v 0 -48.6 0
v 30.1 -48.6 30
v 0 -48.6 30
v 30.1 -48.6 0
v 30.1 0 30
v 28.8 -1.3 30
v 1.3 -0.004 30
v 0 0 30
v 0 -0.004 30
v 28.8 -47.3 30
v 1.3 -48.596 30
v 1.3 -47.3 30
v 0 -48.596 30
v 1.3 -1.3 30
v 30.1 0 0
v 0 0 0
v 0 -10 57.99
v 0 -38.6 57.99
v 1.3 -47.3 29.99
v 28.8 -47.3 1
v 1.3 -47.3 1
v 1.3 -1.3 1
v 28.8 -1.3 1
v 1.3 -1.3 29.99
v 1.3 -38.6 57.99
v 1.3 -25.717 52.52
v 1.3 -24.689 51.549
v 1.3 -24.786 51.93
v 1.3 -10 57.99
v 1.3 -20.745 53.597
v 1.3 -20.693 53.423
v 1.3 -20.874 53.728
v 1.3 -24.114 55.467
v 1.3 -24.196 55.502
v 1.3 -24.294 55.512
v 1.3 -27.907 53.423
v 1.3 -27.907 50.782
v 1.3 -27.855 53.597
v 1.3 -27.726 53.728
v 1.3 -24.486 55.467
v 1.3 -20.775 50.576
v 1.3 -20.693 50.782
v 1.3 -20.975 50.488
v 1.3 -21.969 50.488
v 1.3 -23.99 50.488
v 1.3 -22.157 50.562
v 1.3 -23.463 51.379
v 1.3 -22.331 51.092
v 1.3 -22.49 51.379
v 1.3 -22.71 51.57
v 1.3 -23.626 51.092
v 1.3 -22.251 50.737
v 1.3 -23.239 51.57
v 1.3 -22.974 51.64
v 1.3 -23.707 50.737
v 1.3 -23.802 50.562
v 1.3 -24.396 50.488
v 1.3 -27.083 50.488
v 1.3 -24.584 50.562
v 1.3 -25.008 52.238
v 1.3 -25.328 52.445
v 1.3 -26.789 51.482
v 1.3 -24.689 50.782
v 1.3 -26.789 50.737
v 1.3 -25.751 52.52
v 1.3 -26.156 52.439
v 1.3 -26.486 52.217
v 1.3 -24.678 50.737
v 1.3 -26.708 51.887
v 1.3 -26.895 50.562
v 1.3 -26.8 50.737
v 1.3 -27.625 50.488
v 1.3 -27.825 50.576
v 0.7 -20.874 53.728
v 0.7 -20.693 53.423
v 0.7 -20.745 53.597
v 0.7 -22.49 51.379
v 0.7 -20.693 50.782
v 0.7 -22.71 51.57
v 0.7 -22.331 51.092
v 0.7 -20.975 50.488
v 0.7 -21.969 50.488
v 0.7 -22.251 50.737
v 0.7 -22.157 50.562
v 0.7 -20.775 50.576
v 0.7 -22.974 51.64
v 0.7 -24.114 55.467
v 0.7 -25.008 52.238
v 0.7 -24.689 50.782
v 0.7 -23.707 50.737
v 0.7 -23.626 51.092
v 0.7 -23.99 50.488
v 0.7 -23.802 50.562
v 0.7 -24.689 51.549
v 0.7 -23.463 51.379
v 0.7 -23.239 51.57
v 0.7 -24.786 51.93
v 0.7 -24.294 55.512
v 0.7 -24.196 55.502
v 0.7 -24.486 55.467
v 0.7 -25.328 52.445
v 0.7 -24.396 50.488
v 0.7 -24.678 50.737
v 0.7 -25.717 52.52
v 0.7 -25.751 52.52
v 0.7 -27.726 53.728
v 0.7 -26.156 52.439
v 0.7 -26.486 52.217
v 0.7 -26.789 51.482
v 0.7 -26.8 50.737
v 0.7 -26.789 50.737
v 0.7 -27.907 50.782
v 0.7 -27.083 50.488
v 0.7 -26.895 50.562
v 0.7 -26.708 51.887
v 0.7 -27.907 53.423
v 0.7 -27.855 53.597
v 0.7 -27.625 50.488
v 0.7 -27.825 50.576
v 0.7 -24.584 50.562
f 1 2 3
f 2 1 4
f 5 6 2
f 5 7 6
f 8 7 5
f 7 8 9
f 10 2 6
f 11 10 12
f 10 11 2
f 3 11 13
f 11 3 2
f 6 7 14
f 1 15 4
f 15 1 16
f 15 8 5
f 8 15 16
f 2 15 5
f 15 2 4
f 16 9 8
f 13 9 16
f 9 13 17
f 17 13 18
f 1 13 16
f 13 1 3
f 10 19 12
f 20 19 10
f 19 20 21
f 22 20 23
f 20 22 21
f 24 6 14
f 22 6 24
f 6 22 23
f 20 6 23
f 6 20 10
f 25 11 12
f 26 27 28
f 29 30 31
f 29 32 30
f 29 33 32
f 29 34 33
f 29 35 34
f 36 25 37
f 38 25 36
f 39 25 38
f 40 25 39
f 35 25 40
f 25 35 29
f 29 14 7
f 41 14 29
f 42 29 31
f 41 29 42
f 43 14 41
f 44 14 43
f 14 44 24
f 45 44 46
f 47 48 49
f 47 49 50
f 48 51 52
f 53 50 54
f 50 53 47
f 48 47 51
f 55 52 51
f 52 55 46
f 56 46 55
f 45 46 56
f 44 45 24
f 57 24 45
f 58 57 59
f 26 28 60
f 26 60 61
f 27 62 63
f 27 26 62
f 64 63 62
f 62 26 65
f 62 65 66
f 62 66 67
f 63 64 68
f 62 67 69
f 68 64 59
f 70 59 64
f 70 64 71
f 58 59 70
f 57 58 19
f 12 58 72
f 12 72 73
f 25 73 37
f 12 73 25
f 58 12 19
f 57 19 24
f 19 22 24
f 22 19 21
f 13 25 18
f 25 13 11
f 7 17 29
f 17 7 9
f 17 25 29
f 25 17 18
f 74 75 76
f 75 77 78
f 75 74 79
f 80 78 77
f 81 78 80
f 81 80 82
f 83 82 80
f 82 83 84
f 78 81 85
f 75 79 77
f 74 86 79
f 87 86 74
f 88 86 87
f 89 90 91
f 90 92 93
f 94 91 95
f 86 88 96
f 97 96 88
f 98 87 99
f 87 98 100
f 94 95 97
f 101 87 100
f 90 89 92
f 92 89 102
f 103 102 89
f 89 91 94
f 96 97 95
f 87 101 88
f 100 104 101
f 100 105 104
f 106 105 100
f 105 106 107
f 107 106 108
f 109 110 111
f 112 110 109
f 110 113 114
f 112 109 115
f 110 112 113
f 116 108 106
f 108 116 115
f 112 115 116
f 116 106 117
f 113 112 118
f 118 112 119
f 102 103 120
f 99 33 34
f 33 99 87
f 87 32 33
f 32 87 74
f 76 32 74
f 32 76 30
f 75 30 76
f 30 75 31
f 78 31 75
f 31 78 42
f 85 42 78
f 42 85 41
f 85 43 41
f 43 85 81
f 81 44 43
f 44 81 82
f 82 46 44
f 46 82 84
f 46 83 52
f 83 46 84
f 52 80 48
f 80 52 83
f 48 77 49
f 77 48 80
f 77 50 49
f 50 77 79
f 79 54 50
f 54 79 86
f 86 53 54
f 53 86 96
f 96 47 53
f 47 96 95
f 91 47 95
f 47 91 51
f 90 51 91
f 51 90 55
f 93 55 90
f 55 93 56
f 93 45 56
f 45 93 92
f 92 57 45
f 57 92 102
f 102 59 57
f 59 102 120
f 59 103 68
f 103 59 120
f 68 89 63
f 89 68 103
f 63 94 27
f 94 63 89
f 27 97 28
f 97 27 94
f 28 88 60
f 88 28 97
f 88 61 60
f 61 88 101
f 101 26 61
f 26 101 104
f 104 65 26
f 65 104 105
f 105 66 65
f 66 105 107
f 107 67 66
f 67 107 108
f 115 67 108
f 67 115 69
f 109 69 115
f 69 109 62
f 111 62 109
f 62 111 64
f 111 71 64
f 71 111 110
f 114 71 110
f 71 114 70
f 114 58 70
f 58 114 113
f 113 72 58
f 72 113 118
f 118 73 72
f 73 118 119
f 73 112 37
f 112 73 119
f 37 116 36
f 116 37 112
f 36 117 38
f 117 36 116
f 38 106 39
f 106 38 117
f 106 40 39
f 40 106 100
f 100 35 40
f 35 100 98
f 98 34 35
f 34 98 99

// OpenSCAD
floor_thickness = 1;
wall_thickness = 1.3;
wall_height = 30; // [25:40]
tab_height = 28;
icon = "abbey"; // [none:None,abbey:Abbey and Mayor,bridges:Bridges Castles and Bazaar,catapult:Catapult,count:Count,crop:Crop Circles,ferry:Ferries,flyer:Flyers,gold:Gold Mines,inns:Inns and Cathedrals,king:King,mage:Mage and Witch,messages:Messages,plague:Plague,princess:Princess and Dragon,robbers:Robbers,spielbox:Spielbox,tower:Tower,traders:Traders and Builders,wheel:Wheel of Fortune]

inset = 0.9;

inside_length = 27.5;

/* [Hidden] */
length = inside_length + wall_thickness * 2;
width = 46 + wall_thickness * 2;
fudge = 0.1;

rotate(a=[0,0,-90]) {
difference () {
union () {
difference () {
	cube([width,length,wall_height]);
	translate ([wall_thickness,wall_thickness,floor_thickness]) {
		cube([46,inside_length,wall_height]);
	}
};
translate([0,wall_thickness,wall_height-.01])
rotate(a=[90,0,0])
linear_extrude(height = wall_thickness)
	polygon(points=[[0,0],[10,tab_height],[width - 10,tab_height],[width,0]]);
};

translate([width/2,1.5 - inset + fudge,wall_height + tab_height - 5])
rotate(a=[90,0,180])
	if (icon == "abbey")
		abbey(inset + fudge);
	else if (icon == "bridges")
		bridges(inset + fudge);
	else if (icon == "catapult")
		catapult(inset + fudge);
	else if (icon == "count")
		count(inset + fudge);
	else if (icon == "crop")
		crop(inset + fudge);
	else if (icon == "ferry")
		ferry(inset + fudge);
	else if (icon == "flyer")
		flyer(inset + fudge);
	else if (icon == "gold")
		gold(inset + fudge);
	else if (icon == "inns")
		inns(inset + fudge);
	else if (icon == "king")
		king(inset + fudge);
	else if (icon == "mage")
		mage(inset + fudge);
	else if (icon == "messages")
		messages(inset + fudge);
	else if (icon == "plague")
		plague(inset + fudge);
	else if (icon == "princess")
		princess(inset + fudge);
	else if (icon == "robbers")
		robbers(inset + fudge);
	else if (icon == "spielbox")
		spielbox(inset + fudge);
	else if (icon == "tower")
		tower(inset + fudge);
	else if (icon == "traders")
		traders(inset + fudge);
	else if (icon == "wheel")
		wheel(inset + fudge);
	else if (icon == "m")
		m(inset + fudge);
};
};

module abbey(h) {
  scale([25.4/90, -25.4/90, 1])
  {
    linear_extrude(height=h)
      polygon([[4.699935,4.819935],[5.634285,5.066798],[6.414915,5.744925],[6.978016,6.760539],[7.259905,8.019895],[7.594905,8.639885],[8.259895,8.899885],[11.779845,8.899885],[12.489835,8.589885],[12.779835,7.859895],[12.779835,-1.499985],[12.594835,-2.114975],[12.139845,-2.579965],[0.659995,-8.739885],[0.369995,-8.864885],[0.019995,-8.899885],[-0.659995,-8.739885],[-12.139845,-2.579965],[-12.594835,-2.114975],[-12.779835,-1.499985],[-12.779835,7.859895],[-12.489845,8.589885],[-11.779845,8.899885],[-9.859875,8.899885],[-9.194885,8.639885],[-8.859885,8.019895],[-8.819885,8.019895],[-8.819885,5.379925],[-8.531781,3.944327],[-7.744905,2.774965],[-6.575549,1.988103],[-5.139935,1.699975],[-5.019935,1.699975],[-3.641211,1.967463],[-2.509965,2.699965],[-1.723740,3.792454],[-1.379985,5.139935],[-1.379985,7.859895],[-1.359985,7.939895],[-1.339985,8.019895],[-1.004985,8.639885],[-0.339995,8.899885],[1.099985,8.899885],[1.764975,8.639885],[2.099975,8.019895],[2.388076,6.760539],[2.964965,5.744925],[3.759314,5.066813],[4.699935,4.819935]]);
};
};
module bridges(h) {
  scale([25.4/90, -25.4/90, 1])
  {
    linear_extrude(height=h)
      polygon([[-13.159830,7.079910],[-9.959870,7.079910],[-9.959870,5.199930],[-9.738297,3.193399],[-9.181121,1.361236],[-8.288330,-0.296557],[-7.059910,-1.779980],[-5.576498,-3.008394],[-3.918709,-3.901191],[-2.086542,-4.458373],[-0.080000,-4.679940],[0.120000,-4.679940],[2.128714,-4.458365],[3.964936,-3.901184],[5.628668,-3.008391],[7.119910,-1.779980],[8.356128,-0.296557],[9.254860,1.361236],[9.816107,3.193399],[10.039870,5.199930],[10.039870,7.079910],[13.159830,7.079910],[13.159830,-7.079910],[-13.159830,-7.079910]]);
};
};
module catapult(h) {
difference()
{
  scale([25.4/90, -25.4/90, 1])
  {
    linear_extrude(height=h)
         polygon([[-9.779880,8.079900],[-8.689890,9.349880],[-7.059910,9.839870],[-5.429930,9.349880],[-4.339950,8.079900],[4.699940,8.079900],[5.789920,9.349880],[7.419900,9.839870],[9.049880,9.349880],[10.139870,8.079900],[10.939860,8.079900],[10.939860,5.399930],[10.059870,5.399930],[9.289880,4.484940],[8.219890,3.959950],[2.059970,-5.119930],[1.939970,-5.119930],[1.939970,-5.159930],[0.060000,-5.159930],[0.060000,-9.799870],[-0.020000,-9.819870],[-0.100000,-9.839870],[-1.266868,-9.595477],[-2.234970,-8.934880],[-2.895598,-7.966755],[-3.139960,-6.799910],[-2.956215,-5.775535],[-2.449970,-4.904940],[-1.688738,-4.251809],[-0.739990,-3.879950],[-0.739990,5.399930],[-4.419950,5.399930],[-5.514930,4.274940],[-7.059910,3.839950],[-8.604890,4.274950],[-9.699880,5.399930],[-10.939860,5.399930],[-10.939860,8.079900]]);
	};
  scale([25.4/90, -25.4/90, 1])
  {
    linear_extrude(height=h)
           polygon([[5.419930,4.639940],[5.069930,5.004940],[4.779940,5.399930],[1.939970,5.399930],[1.939970,-0.439990]]);
	};
};
};
module count(h) {
  scale([25.4/90, -25.4/90, 1])
  {
    linear_extrude(height=h)
      polygon([[-11.179855,-2.259990],[-11.259855,9.579860],[11.259855,9.539860],[11.179855,-3.899970],[10.659865,-3.899970],[9.459875,-1.779990],[9.499875,-1.659990],[9.939875,-1.340000],[9.979875,-0.220010],[9.739885,0.099980],[9.739885,0.979970],[9.379885,1.499970],[9.379885,1.579970],[9.459885,1.579970],[9.459885,1.699970],[9.499885,1.699970],[9.539885,2.059970],[9.499885,2.059970],[9.499885,2.139970],[9.539885,2.139970],[9.539885,2.659960],[8.459895,2.659960],[7.859905,2.739960],[7.859905,1.859970],[7.899905,1.859970],[7.899905,1.779970],[7.859905,1.739970],[7.819905,1.659970],[7.819905,1.579970],[6.739925,-0.500000],[6.699925,-1.059990],[6.619925,-0.460000],[5.779935,1.539970],[5.779935,1.619970],[5.739935,1.619970],[5.819935,1.739970],[5.939935,1.739970],[5.979935,2.939960],[5.859935,3.019960],[5.859935,3.099960],[5.899935,3.099960],[5.899935,3.139960],[5.699935,3.179960],[5.459935,3.219960],[5.459935,3.419960],[5.659935,3.419960],[5.619935,3.619960],[5.499935,3.619960],[5.459935,3.539960],[5.339935,3.619960],[5.339935,4.139950],[5.219945,4.139950],[5.259945,4.259950],[5.339945,4.299950],[5.339945,4.819940],[2.979985,4.899940],[2.979985,4.859940],[3.059985,4.819940],[3.059985,4.699940],[2.979985,4.699940],[2.979985,2.619970],[3.174975,2.169980],[2.619985,1.779980],[1.140005,1.384990],[-0.339975,0.899990],[-0.379975,0.740000],[-0.379975,-1.939970],[-0.299975,-1.979970],[-0.219975,-2.259970],[-0.379975,-2.419960],[-0.379975,-3.099960],[-0.339975,-3.099960],[-0.339975,-3.259950],[-0.419975,-3.379950],[-0.459975,-5.979920],[-0.259975,-6.139920],[-0.699975,-7.579900],[-0.899965,-7.739900],[-2.059955,-7.939890],[-2.339955,-7.979890],[-2.419955,-8.259890],[-2.374955,-8.359890],[-2.419955,-8.459890],[-2.419955,-8.659880],[-2.269955,-8.559880],[-2.179955,-8.459880],[-2.084955,-8.269880],[-1.779955,-8.019880],[-1.699955,-8.019880],[-1.714955,-8.199880],[-1.699955,-8.379880],[-1.539965,-8.209880],[-1.379965,-8.099880],[-1.299965,-8.179880],[-1.579965,-8.584880],[-1.859955,-8.899870],[-2.104955,-9.284870],[-2.379955,-9.579860],[-2.539945,-9.579860],[-2.539945,-8.459880],[-2.619945,-8.389880],[-2.579945,-8.259880],[-2.619945,-7.939880],[-2.979945,-7.939880],[-4.939915,-7.499890],[-4.939915,-7.219890],[-4.859915,-7.179890],[-4.859915,-7.019890],[-4.739925,-6.939890],[-4.699925,-4.099920],[-4.819915,-4.099920],[-4.819915,-3.899930],[-4.779915,-3.899930],[-4.739915,-2.979940],[-4.859905,-2.939940],[-4.859905,-2.779940],[-4.779905,-2.739940],[-4.779905,-1.419960],[-4.859905,1.620000],[-6.179895,1.620000],[-6.219895,-1.739950],[-7.499875,-2.539940],[-7.979865,-2.499940],[-7.979865,-2.059950],[-7.939865,-2.059950],[-7.939865,-1.859950],[-8.699855,-2.379940]]);
	};
};

module crop(h) {
  scale([25.4/90, -25.4/90, 1])
	union() {
    linear_extrude(height=h)
      polygon([[-0.719995,6.579910],[-0.879995,8.099890],[-0.550625,9.979249],[0.434995,11.524850],[2.073091,12.627965],[4.359945,13.179830],[4.399945,12.139840],[2.678081,11.689225],[1.424975,10.814860],[0.659360,9.513005],[0.399995,7.779900],[0.439995,6.819910],[-0.020005,5.874920],[-0.719995,6.579910]]);
    linear_extrude(height=h)
      polygon([[0.159995,4.779940],[0.039995,5.339930],[0.259995,5.844920],[0.839985,6.019920],[1.619975,5.829920],[2.519965,5.219930],[3.464955,3.674950],[4.199945,1.739980],[1.909975,2.884960],[0.903731,3.579336],[0.159995,4.779940]]);
    linear_extrude(height=h)
      polygon([[-2.719965,5.179930],[-1.834975,5.789920],[-1.039985,5.979920],[-0.479995,5.804920],[-0.279995,5.299930],[-0.399995,4.739940],[-1.137493,3.539961],[-2.129975,2.849960],[-4.399945,1.739980],[-3.664955,3.639950],[-2.719965,5.179930]]);
    linear_extrude(height=h)
      polygon([[-2.679965,2.259970],[-1.799985,2.869960],[-1.039985,3.059960],[-0.459995,2.864960],[-0.240005,2.339970],[-0.359995,1.819970],[-1.079993,0.637500],[-2.069975,-0.050000],[-4.319945,-1.139990],[-3.604955,0.754990],[-2.679965,2.259970]]);
    linear_extrude(height=h)
      polygon([[0.199995,1.739980],[0.079995,2.299970],[0.299995,2.804960],[0.879985,2.979960],[1.659975,2.789960],[2.559965,2.179970],[3.504955,0.639990],[4.239945,-1.259990],[1.919975,-0.090000],[0.921231,0.585001],[0.199995,1.739980]]);
    linear_extrude(height=h)
      polygon([[0.199995,-1.179990],[0.079995,-0.619990],[0.299995,-0.095000],[0.879985,0.100000],[1.674975,-0.090000],[2.559965,-0.699990],[3.504955,-2.259970],[4.239945,-4.179950],[1.949975,-3.069960],[0.943731,-2.379960],[0.199995,-1.179990]]);
    linear_extrude(height=h)
      polygon([[-2.679965,-0.739990],[-1.794985,-0.130000],[-0.999995,0.060000],[-0.439995,-0.115000],[-0.240005,-0.619990],[-0.359995,-1.179990],[-1.091242,-2.362460],[-2.069975,-3.049960],[-4.319945,-4.139950],[-3.604955,-2.244970],[-2.679965,-0.739990]]);
    linear_extrude(height=h)
      polygon([[-2.679965,-3.659950],[-1.794985,-3.049960],[-0.999995,-2.859960],[-0.439995,-3.034960],[-0.240005,-3.539960],[-0.359995,-4.099950],[-1.097492,-5.306166],[-2.089975,-6.009920],[-4.359945,-7.139910],[-3.624955,-5.219930],[-2.679965,-3.659950]]);
    linear_extrude(height=h)
      polygon([[0.199995,-4.139950],[0.079995,-3.579960],[0.279995,-3.074960],[0.839985,-2.899960],[1.634975,-3.089960],[2.519965,-3.699950],[3.464955,-5.239930],[4.199945,-7.139910],[1.929975,-6.029920],[0.937481,-5.339920],[0.199995,-4.139950]]);
    linear_extrude(height=h)
      polygon([[0.319995,-6.939910],[0.199995,-6.459920],[0.394995,-5.989920],[0.919985,-5.819930],[2.439965,-6.539920],[3.269955,-7.934900],[3.919945,-9.659880],[1.879975,-8.644890],[0.983731,-8.011756],[0.319995,-6.939910]]);
    linear_extrude(height=h)
      polygon([[-2.479975,-6.539920],[-1.679985,-5.999920],[-0.999995,-5.819930],[-0.474995,-5.989930],[-0.279995,-6.459920],[-0.399995,-6.939910],[-1.063743,-8.011756],[-1.959975,-8.644890],[-3.999955,-9.659880],[-3.329955,-7.934900],[-2.479975,-6.539920]]);
    linear_extrude(height=h)
      polygon([[0.199995,-9.259880],[0.079995,-8.859890],[0.244995,-8.499890],[0.679985,-8.379890],[1.254985,-8.509890],[1.919975,-8.939890],[2.614965,-10.064870],[3.159955,-11.459850],[1.484975,-10.644860],[0.746856,-10.137972],[0.199995,-9.259880]]);
    linear_extrude(height=h)
      polygon([[-1.999975,-9.019890],[-1.349985,-8.534890],[-0.759995,-8.379890],[-0.359995,-8.504890],[-0.200005,-8.899890],[-0.280005,-9.259880],[-0.756882,-10.174226],[-1.454995,-10.724860],[-3.079975,-11.619850],[-2.629975,-10.184870],[-1.999985,-9.019890]]);
    linear_extrude(height=h)
      polygon([[-1.399985,-11.139860],[-0.939995,-10.619860],[-0.479995,-10.459870],[-0.225005,-10.559870],[-0.120005,-10.899860],[-0.120005,-11.019860],[-0.724995,-12.249840],[-1.719985,-13.179830],[-1.634985,-12.069850],[-1.399985,-11.139860]]);
    linear_extrude(height=h)
      polygon([[-0.000005,-11.019860],[-0.000005,-10.899860],[0.104995,-10.559870],[0.359995,-10.459870],[0.819985,-10.619860],[1.279985,-11.139860],[1.534975,-12.069850],[1.639975,-13.179830],[0.624985,-12.249840],[-0.000005,-11.019860]]);
};
};

module ferry(h)
{
  scale([25.4/90, -25.4/90, 1]) union()
  {
    linear_extrude(height=h)
      polygon([[-8.499890,3.339955],[8.499890,3.339955],[12.339840,-1.099985],[12.339840,-3.339955],[0.300000,-2.979965],[-12.339840,-3.339955],[-12.339840,-1.099985]]);
  }
}

module flyer(h)
{
  scale([25.4/90, -25.4/90, 1]) union()
  {
    linear_extrude(height=h)
      polygon([[-12.739835,4.059950],[-11.049855,3.934950],[-9.419875,3.899950],[-4.969316,4.251811],[-0.904985,5.274930],[2.791826,6.920541],[6.139925,9.139880],[6.539915,8.579890],[5.219935,7.699900],[5.981155,5.658682],[7.109905,3.849950],[8.583620,2.266228],[10.379865,0.899990],[12.699835,1.019990],[12.739835,0.500000],[10.619865,0.380000],[8.859885,-2.234970],[8.299895,-4.819940],[8.559885,-6.619910],[9.299875,-8.419890],[11.139855,-8.579890],[11.099855,-9.139880],[7.626766,-8.602691],[4.247433,-7.673638],[0.961853,-6.352721],[-2.229975,-4.639940],[-8.002401,-0.556234],[-12.739835,4.059950]]);
  }
}

module gold(h)
{
  scale([25.4/90, -25.4/90, 1]) union()
  {
    linear_extrude(height=h)
      polygon([[-8.759885,3.519950],[8.759885,3.519950],[5.959925,-3.519950],[-5.959925,-3.519950]]);
  }
}

module inns(h)
{
  scale([25.4/90, -25.4/90, 1]) union()
  {
    linear_extrude(height=h)
      polygon([[-10.639865,9.759870],[-10.874865,10.429870],[-10.959865,11.039860],[-10.514865,12.104840],[-9.319885,12.479840],[-9.239885,12.479840],[-3.599955,12.479840],[-2.864965,12.114840],[-2.279975,11.239850],[-0.000005,6.599910],[0.039995,6.599910],[2.279965,11.239850],[2.864955,12.114840],[3.599955,12.479840],[9.279875,12.479840],[9.359875,12.479840],[10.534865,12.104840],[10.959855,11.039860],[10.639865,9.759870],[6.519915,1.039990],[8.989885,0.624990],[11.039855,-0.000000],[11.834845,-0.539990],[12.119845,-1.319980],[11.899845,-2.119970],[11.199855,-3.039960],[7.959895,-5.389930],[3.639955,-7.079910],[3.386824,-9.374862],[2.724965,-11.069860],[1.620590,-12.119824],[0.039995,-12.479840],[-0.000005,-12.479840],[-1.586864,-12.119835],[-2.704965,-11.069860],[-3.380589,-9.374863],[-3.639955,-7.079910],[-7.959905,-5.389930],[-11.199855,-3.039960],[-11.899855,-2.119970],[-12.119845,-1.319980],[-11.834845,-0.539990],[-11.039865,-0.000000],[-8.969885,0.624990],[-6.479915,1.039990]]);
  }
}

module king(h)
{
  scale([25.4/90, -25.4/90, 1]) union()
  {
    linear_extrude(height=h)
      polygon([[-10.619865,7.699900],[10.619865,7.699900],[10.579865,-0.499990],[11.259855,-7.579900],[7.859895,-0.739990],[5.619925,-7.619900],[2.859965,-0.739990],[0.019995,-7.699900],[-2.819965,-0.739990],[-5.619925,-7.619900],[-7.859905,-0.739990],[-11.259855,-7.579900],[-10.579865,-0.499990]]);
  }
}

module mage(h)
{
  scale([25.4/90, -25.4/90, 1]) union()
  {
    linear_extrude(height=h)
      polygon([[-10.799860,8.439890],[-10.558457,8.972388],[-9.950498,9.459884],[-7.634900,10.299870],[-4.201825,10.869861],[0.000000,11.079860],[4.201810,10.869861],[7.634900,10.299870],[9.950479,9.459884],[10.558445,8.972388],[10.799860,8.439890],[10.503604,7.828029],[9.659870,7.264910],[6.599910,6.359920],[0.000000,-11.079860],[-6.639920,6.359920],[-9.679880,7.264910],[-10.509866,7.828033],[-10.799860,8.439890]]);
  }
}

module messages(h)
{
  scale([25.4/90, -25.4/90, 1]) union()
  {
    linear_extrude(height=h)
      polygon([[-11.839845,6.379920],[-11.839845,6.739920],[-11.384855,8.229900],[-9.759875,9.179880],[7.839905,9.179880],[6.804275,8.936135],[6.124925,8.489890],[5.639925,7.259910],[5.694925,6.819920],[5.839925,6.379920]]);
    linear_extrude(height=h)
      polygon([[10.719865,-9.179880],[7.479905,-9.179880],[-6.199915,-9.099880],[-7.021164,-8.839249],[-7.579905,-8.094890],[-7.999895,-5.379930],[-7.964895,-4.159940],[-7.839895,-2.819960],[-7.434905,1.009990],[-7.239905,4.419950],[-7.279905,5.579930],[6.919915,5.539930],[6.959915,5.579930],[6.454915,6.389920],[6.279925,7.379910],[6.289925,7.699900],[6.359925,8.019900],[7.019925,8.689890],[8.039905,8.939890],[8.384905,8.889890],[8.639895,8.779890],[9.198625,8.149900],[9.569885,7.189910],[9.839885,4.459950],[9.659885,1.059990],[9.239895,-2.819960],[9.039895,-5.819920],[9.429895,-8.204890],[9.951116,-8.874241],[10.719875,-9.179880]]);
    linear_extrude(height=h)
      polygon([[10.959855,-9.179880],[10.432975,-8.910472],[10.014875,-8.224890],[9.639875,-6.339920],[9.639875,-6.099920],[11.079855,-6.099920],[11.639855,-6.929910],[11.839845,-7.819900],[11.624855,-8.634890],[10.959855,-9.179880]]);
  }
}

module plague(h)
{
  scale([25.4/90, -25.4/90, 1]) union()
  {
    linear_extrude(height=h)
      polygon([[-2.399970,-9.279885],[-1.919970,-8.879885],[-1.999970,-7.799905],[-5.389930,-7.099915],[-8.599890,-6.039925],[-9.359880,-5.359935],[-9.229880,-5.079935],[-8.799890,-4.799935],[-5.854920,-4.359945],[-2.159970,-4.159945],[-2.199970,-3.319955],[-6.233050,-2.088710],[-9.384880,-0.369995],[-11.644226,1.843736],[-12.999830,4.559945],[-11.739850,3.414963],[-10.239870,2.719965],[-8.984880,2.604965],[-7.639900,2.159975],[-7.439900,2.159975],[-5.709930,2.059975],[-3.559950,1.959975],[-2.624970,1.999975],[-1.959970,2.159975],[-1.784980,2.564965],[-1.279980,2.879965],[-1.054980,3.414955],[-0.439990,3.919945],[-0.399990,4.279945],[-0.684990,5.244935],[-1.479980,6.119925],[-2.559972,6.834914],[-3.519950,7.879895],[-3.759950,8.479885],[-3.149960,9.209875],[-1.039990,9.759875],[0.574990,10.104865],[2.279970,10.239865],[4.189305,10.068605],[6.274920,9.499875],[8.563000,8.451145],[11.079860,6.839915],[9.574880,5.869925],[8.159900,4.719935],[6.999910,2.639965],[6.559920,-0.279995],[6.569920,-1.029985],[6.639920,-1.839975],[6.994910,-2.639965],[7.199910,-3.559955],[8.379890,-3.539955],[9.559880,-3.519955],[10.939860,-3.559955],[12.319840,-3.719955],[12.839840,-3.989945],[12.999830,-4.319945],[12.399840,-5.119935],[8.079900,-7.079905],[8.514890,-7.999895],[9.399880,-8.559895],[9.814870,-8.859885],[9.479880,-9.159885],[9.019880,-9.304885],[8.559890,-9.359885],[8.279890,-9.334885],[7.999900,-9.279885],[6.584920,-10.029875],[4.479940,-10.239865],[-1.999970,-10.239865],[-2.799960,-9.894875],[-2.399970,-9.279885]]);
  }
}

module princess(h)
{
  scale([25.4/90, -25.4/90, 1]) union()
  {
    linear_extrude(height=h)
      polygon([[-6.399915,10.639865],[-6.519915,11.359855],[-5.994925,12.594835],[-4.599935,13.079835],[-1.879975,13.039835],[0.020005,13.019835],[1.919975,12.999835],[4.639945,12.999835],[6.014925,12.494835],[6.519915,11.239855],[6.399915,10.479865],[4.279945,4.439945],[3.909955,3.359955],[3.479955,2.159975],[3.319955,1.679975],[6.159925,1.679975],[7.399905,1.159985],[7.919895,-0.079995],[7.919895,-0.119995],[7.399905,-1.359985],[6.159925,-1.879975],[2.239975,-1.879975],[2.319975,-2.079975],[2.844965,-4.059945],[3.039965,-6.399915],[2.812451,-8.945491],[2.179975,-11.074855],[1.217479,-12.536694],[0.000005,-13.079835],[-1.211239,-12.531054],[-2.159975,-11.059855],[-2.778715,-8.928616],[-2.999955,-6.399915],[-2.824965,-4.094945],[-2.319965,-2.119975],[-2.199975,-1.879975],[-6.119915,-1.879975],[-7.379905,-1.359985],[-7.919895,-0.119995],[-7.919895,-0.079995],[-7.379905,1.159985],[-6.119915,1.679975],[-3.319955,1.679975],[-3.479955,2.159975],[-3.929945,3.414955],[-4.319945,4.519945]]);
  }
}

module robbers(h)
{
  scale([25.4/90, -25.4/90, 1]) union()
  {
    linear_extrude(height=h)
      polygon([[-5.559925,-11.539845],[-5.649925,-11.369855],[-5.679925,-11.139855],[-4.699945,-8.854885],[-2.999965,-6.899905],[-3.539955,-6.454915],[-3.719955,-5.739925],[-3.554955,-5.034935],[-3.119965,-4.539935],[-6.221802,-2.188080],[-7.281945,-0.850444],[-8.014905,0.594995],[-8.840516,3.700587],[-9.039885,7.019915],[-8.994885,9.259885],[-8.919885,11.499855],[-8.093650,12.104850],[-6.509915,12.499845],[-2.839965,12.779835],[2.859955,12.739835],[7.359905,12.579845],[8.504885,11.934845],[8.959885,10.539865],[9.014885,9.444885],[9.039885,8.379895],[8.723004,4.544326],[7.734895,1.094985],[6.019285,-1.941831],[3.519955,-4.539935],[4.079945,-4.969935],[4.279945,-5.699925],[4.099945,-6.364915],[3.559955,-6.819905],[6.009915,-9.264875],[6.552400,-10.267971],[6.719915,-11.139855],[6.499915,-12.009845],[5.919925,-12.699835],[5.879925,-12.699835],[5.184925,-11.934845],[4.159945,-11.139855],[4.119945,-11.139855],[3.509955,-11.414845],[2.959955,-12.019845],[2.264957,-12.594818],[1.599975,-12.779835],[1.199985,-12.724835],[0.799985,-12.579835],[-0.090005,-12.004845],[-0.919995,-11.219855],[-1.379985,-10.894855],[-1.839975,-10.779855],[-2.679965,-11.099855],[-3.539955,-11.549845],[-4.519945,-11.699845],[-5.559935,-11.539845]]);
  }
}

module spielbox(h)
{
  scale([25.4/90, -25.4/90, 1]) union()
  {
    linear_extrude(height=h)
      polygon([[10.599865,-2.359970],[-0.000005,-10.079870],[-10.599865,-2.359970],[-6.559915,10.079870],[6.559915,10.079870]]);
  }
}

module tower(h)
{
  scale([25.4/90, -25.4/90, 1]) union()
  {
    linear_extrude(height=h)
      polygon([[-4.799935,11.259855],[4.799935,11.259855],[4.119945,-6.379915],[5.599925,-6.379915],[5.839925,-11.259855],[4.039945,-11.259855],[4.039945,-9.979875],[2.319965,-9.979875],[2.319965,-11.259855],[0.799985,-11.259855],[0.799985,-9.979875],[-0.799995,-9.979875],[-0.799995,-11.259855],[-2.319975,-11.259855],[-2.319975,-9.979875],[-4.039945,-9.979875],[-4.039945,-11.259855],[-5.839925,-11.259855],[-5.599925,-6.379915],[-4.119945,-6.379915]]);
  }
}

module traders(h)
{
  scale([25.4/90, -25.4/90, 1]) union()
  {
    linear_extrude(height=h)
      polygon([[-3.919950,6.399920],[-3.559950,6.849910],[-2.959960,6.999910],[-2.294970,6.794910],[-1.959970,6.199920],[-1.999970,4.599940],[0.854990,4.849940],[3.679950,4.919940],[4.999940,4.899940],[6.319920,4.879940],[6.399920,6.319920],[6.739910,6.824910],[7.439900,6.999910],[8.099900,6.824910],[8.399890,6.319920],[8.399890,6.279920],[8.439890,5.519930],[8.973619,4.603694],[9.769870,3.859950],[10.521096,2.876219],[10.919860,1.239980],[10.959860,0.559990],[10.804977,-1.239979],[10.319870,-2.679970],[10.359870,-2.679970],[11.250462,-2.983704],[11.844850,-3.489960],[12.279840,-4.839940],[12.199840,-5.319930],[11.664850,-6.274920],[10.559860,-6.719910],[9.879870,-6.599920],[9.249880,-6.039920],[9.039880,-5.239930],[9.279880,-4.439940],[9.999870,-4.119950],[10.569860,-4.274950],[10.959860,-4.639940],[10.799860,-5.239930],[10.174870,-4.924940],[9.879870,-5.119940],[9.879870,-5.239930],[10.124870,-5.689930],[10.639860,-5.839930],[11.079860,-5.679930],[11.349850,-5.304930],[11.439850,-4.839940],[11.084860,-3.944950],[9.919870,-3.439960],[9.879870,-3.399960],[8.814870,-4.435560],[7.449900,-5.114940],[3.999950,-5.599930],[0.245000,-5.294930],[-3.719950,-4.599940],[-3.679950,-4.879940],[-3.888714,-5.801790],[-4.419940,-6.344920],[-5.879920,-6.999910],[-6.384920,-5.759930],[-6.559920,-4.399940],[-11.679850,-3.079960],[-12.159840,-2.884960],[-12.279840,-2.479970],[-12.259840,-2.199970],[-12.239840,-1.919980],[-12.149840,-1.604980],[-12.119840,-1.319980],[-12.139840,-1.019990],[-12.159840,-0.719990],[-12.029840,-0.245000],[-11.479850,0.319990],[-10.534860,1.044990],[-7.639900,1.559980],[-7.177414,2.401224],[-6.279920,3.189960],[-3.959950,4.999930]]);
  }
}

module m(h)
{
  scale([25.4/90, -25.4/90, 1]) union()
  {
    linear_extrude(height=h)
      polygon([[14.228490,14.003905],[8.564430,14.003905],[8.564430,-2.753905],[8.798810,-8.750005],[8.642560,-8.750005],[8.330060,-7.500005],[7.978490,-6.318365],[7.636700,-5.322265],[7.353490,-4.609375],[2.040990,5.605465],[-2.373070,5.605465],[-7.509790,-4.648445],[-7.724630,-5.205085],[-8.017600,-6.123055],[-8.339860,-7.324225],[-8.623070,-8.750005],[-8.798850,-8.750005],[-8.603540,-5.371095],[-8.544940,-2.773445],[-8.544940,14.003905],[-14.228540,14.003905],[-14.228540,-14.003905],[-6.494160,-14.003905],[-1.552760,-4.277345],[-1.123070,-3.281255],[-0.703150,-2.226565],[-0.332050,-1.201175],[-0.087910,-0.273445],[0.009790,-0.273445],[0.263700,-1.240235],[0.556670,-2.324225],[0.888700,-3.388675],[1.259790,-4.316405],[6.337920,-14.003905],[14.228540,-14.003905]]);
  }
}
